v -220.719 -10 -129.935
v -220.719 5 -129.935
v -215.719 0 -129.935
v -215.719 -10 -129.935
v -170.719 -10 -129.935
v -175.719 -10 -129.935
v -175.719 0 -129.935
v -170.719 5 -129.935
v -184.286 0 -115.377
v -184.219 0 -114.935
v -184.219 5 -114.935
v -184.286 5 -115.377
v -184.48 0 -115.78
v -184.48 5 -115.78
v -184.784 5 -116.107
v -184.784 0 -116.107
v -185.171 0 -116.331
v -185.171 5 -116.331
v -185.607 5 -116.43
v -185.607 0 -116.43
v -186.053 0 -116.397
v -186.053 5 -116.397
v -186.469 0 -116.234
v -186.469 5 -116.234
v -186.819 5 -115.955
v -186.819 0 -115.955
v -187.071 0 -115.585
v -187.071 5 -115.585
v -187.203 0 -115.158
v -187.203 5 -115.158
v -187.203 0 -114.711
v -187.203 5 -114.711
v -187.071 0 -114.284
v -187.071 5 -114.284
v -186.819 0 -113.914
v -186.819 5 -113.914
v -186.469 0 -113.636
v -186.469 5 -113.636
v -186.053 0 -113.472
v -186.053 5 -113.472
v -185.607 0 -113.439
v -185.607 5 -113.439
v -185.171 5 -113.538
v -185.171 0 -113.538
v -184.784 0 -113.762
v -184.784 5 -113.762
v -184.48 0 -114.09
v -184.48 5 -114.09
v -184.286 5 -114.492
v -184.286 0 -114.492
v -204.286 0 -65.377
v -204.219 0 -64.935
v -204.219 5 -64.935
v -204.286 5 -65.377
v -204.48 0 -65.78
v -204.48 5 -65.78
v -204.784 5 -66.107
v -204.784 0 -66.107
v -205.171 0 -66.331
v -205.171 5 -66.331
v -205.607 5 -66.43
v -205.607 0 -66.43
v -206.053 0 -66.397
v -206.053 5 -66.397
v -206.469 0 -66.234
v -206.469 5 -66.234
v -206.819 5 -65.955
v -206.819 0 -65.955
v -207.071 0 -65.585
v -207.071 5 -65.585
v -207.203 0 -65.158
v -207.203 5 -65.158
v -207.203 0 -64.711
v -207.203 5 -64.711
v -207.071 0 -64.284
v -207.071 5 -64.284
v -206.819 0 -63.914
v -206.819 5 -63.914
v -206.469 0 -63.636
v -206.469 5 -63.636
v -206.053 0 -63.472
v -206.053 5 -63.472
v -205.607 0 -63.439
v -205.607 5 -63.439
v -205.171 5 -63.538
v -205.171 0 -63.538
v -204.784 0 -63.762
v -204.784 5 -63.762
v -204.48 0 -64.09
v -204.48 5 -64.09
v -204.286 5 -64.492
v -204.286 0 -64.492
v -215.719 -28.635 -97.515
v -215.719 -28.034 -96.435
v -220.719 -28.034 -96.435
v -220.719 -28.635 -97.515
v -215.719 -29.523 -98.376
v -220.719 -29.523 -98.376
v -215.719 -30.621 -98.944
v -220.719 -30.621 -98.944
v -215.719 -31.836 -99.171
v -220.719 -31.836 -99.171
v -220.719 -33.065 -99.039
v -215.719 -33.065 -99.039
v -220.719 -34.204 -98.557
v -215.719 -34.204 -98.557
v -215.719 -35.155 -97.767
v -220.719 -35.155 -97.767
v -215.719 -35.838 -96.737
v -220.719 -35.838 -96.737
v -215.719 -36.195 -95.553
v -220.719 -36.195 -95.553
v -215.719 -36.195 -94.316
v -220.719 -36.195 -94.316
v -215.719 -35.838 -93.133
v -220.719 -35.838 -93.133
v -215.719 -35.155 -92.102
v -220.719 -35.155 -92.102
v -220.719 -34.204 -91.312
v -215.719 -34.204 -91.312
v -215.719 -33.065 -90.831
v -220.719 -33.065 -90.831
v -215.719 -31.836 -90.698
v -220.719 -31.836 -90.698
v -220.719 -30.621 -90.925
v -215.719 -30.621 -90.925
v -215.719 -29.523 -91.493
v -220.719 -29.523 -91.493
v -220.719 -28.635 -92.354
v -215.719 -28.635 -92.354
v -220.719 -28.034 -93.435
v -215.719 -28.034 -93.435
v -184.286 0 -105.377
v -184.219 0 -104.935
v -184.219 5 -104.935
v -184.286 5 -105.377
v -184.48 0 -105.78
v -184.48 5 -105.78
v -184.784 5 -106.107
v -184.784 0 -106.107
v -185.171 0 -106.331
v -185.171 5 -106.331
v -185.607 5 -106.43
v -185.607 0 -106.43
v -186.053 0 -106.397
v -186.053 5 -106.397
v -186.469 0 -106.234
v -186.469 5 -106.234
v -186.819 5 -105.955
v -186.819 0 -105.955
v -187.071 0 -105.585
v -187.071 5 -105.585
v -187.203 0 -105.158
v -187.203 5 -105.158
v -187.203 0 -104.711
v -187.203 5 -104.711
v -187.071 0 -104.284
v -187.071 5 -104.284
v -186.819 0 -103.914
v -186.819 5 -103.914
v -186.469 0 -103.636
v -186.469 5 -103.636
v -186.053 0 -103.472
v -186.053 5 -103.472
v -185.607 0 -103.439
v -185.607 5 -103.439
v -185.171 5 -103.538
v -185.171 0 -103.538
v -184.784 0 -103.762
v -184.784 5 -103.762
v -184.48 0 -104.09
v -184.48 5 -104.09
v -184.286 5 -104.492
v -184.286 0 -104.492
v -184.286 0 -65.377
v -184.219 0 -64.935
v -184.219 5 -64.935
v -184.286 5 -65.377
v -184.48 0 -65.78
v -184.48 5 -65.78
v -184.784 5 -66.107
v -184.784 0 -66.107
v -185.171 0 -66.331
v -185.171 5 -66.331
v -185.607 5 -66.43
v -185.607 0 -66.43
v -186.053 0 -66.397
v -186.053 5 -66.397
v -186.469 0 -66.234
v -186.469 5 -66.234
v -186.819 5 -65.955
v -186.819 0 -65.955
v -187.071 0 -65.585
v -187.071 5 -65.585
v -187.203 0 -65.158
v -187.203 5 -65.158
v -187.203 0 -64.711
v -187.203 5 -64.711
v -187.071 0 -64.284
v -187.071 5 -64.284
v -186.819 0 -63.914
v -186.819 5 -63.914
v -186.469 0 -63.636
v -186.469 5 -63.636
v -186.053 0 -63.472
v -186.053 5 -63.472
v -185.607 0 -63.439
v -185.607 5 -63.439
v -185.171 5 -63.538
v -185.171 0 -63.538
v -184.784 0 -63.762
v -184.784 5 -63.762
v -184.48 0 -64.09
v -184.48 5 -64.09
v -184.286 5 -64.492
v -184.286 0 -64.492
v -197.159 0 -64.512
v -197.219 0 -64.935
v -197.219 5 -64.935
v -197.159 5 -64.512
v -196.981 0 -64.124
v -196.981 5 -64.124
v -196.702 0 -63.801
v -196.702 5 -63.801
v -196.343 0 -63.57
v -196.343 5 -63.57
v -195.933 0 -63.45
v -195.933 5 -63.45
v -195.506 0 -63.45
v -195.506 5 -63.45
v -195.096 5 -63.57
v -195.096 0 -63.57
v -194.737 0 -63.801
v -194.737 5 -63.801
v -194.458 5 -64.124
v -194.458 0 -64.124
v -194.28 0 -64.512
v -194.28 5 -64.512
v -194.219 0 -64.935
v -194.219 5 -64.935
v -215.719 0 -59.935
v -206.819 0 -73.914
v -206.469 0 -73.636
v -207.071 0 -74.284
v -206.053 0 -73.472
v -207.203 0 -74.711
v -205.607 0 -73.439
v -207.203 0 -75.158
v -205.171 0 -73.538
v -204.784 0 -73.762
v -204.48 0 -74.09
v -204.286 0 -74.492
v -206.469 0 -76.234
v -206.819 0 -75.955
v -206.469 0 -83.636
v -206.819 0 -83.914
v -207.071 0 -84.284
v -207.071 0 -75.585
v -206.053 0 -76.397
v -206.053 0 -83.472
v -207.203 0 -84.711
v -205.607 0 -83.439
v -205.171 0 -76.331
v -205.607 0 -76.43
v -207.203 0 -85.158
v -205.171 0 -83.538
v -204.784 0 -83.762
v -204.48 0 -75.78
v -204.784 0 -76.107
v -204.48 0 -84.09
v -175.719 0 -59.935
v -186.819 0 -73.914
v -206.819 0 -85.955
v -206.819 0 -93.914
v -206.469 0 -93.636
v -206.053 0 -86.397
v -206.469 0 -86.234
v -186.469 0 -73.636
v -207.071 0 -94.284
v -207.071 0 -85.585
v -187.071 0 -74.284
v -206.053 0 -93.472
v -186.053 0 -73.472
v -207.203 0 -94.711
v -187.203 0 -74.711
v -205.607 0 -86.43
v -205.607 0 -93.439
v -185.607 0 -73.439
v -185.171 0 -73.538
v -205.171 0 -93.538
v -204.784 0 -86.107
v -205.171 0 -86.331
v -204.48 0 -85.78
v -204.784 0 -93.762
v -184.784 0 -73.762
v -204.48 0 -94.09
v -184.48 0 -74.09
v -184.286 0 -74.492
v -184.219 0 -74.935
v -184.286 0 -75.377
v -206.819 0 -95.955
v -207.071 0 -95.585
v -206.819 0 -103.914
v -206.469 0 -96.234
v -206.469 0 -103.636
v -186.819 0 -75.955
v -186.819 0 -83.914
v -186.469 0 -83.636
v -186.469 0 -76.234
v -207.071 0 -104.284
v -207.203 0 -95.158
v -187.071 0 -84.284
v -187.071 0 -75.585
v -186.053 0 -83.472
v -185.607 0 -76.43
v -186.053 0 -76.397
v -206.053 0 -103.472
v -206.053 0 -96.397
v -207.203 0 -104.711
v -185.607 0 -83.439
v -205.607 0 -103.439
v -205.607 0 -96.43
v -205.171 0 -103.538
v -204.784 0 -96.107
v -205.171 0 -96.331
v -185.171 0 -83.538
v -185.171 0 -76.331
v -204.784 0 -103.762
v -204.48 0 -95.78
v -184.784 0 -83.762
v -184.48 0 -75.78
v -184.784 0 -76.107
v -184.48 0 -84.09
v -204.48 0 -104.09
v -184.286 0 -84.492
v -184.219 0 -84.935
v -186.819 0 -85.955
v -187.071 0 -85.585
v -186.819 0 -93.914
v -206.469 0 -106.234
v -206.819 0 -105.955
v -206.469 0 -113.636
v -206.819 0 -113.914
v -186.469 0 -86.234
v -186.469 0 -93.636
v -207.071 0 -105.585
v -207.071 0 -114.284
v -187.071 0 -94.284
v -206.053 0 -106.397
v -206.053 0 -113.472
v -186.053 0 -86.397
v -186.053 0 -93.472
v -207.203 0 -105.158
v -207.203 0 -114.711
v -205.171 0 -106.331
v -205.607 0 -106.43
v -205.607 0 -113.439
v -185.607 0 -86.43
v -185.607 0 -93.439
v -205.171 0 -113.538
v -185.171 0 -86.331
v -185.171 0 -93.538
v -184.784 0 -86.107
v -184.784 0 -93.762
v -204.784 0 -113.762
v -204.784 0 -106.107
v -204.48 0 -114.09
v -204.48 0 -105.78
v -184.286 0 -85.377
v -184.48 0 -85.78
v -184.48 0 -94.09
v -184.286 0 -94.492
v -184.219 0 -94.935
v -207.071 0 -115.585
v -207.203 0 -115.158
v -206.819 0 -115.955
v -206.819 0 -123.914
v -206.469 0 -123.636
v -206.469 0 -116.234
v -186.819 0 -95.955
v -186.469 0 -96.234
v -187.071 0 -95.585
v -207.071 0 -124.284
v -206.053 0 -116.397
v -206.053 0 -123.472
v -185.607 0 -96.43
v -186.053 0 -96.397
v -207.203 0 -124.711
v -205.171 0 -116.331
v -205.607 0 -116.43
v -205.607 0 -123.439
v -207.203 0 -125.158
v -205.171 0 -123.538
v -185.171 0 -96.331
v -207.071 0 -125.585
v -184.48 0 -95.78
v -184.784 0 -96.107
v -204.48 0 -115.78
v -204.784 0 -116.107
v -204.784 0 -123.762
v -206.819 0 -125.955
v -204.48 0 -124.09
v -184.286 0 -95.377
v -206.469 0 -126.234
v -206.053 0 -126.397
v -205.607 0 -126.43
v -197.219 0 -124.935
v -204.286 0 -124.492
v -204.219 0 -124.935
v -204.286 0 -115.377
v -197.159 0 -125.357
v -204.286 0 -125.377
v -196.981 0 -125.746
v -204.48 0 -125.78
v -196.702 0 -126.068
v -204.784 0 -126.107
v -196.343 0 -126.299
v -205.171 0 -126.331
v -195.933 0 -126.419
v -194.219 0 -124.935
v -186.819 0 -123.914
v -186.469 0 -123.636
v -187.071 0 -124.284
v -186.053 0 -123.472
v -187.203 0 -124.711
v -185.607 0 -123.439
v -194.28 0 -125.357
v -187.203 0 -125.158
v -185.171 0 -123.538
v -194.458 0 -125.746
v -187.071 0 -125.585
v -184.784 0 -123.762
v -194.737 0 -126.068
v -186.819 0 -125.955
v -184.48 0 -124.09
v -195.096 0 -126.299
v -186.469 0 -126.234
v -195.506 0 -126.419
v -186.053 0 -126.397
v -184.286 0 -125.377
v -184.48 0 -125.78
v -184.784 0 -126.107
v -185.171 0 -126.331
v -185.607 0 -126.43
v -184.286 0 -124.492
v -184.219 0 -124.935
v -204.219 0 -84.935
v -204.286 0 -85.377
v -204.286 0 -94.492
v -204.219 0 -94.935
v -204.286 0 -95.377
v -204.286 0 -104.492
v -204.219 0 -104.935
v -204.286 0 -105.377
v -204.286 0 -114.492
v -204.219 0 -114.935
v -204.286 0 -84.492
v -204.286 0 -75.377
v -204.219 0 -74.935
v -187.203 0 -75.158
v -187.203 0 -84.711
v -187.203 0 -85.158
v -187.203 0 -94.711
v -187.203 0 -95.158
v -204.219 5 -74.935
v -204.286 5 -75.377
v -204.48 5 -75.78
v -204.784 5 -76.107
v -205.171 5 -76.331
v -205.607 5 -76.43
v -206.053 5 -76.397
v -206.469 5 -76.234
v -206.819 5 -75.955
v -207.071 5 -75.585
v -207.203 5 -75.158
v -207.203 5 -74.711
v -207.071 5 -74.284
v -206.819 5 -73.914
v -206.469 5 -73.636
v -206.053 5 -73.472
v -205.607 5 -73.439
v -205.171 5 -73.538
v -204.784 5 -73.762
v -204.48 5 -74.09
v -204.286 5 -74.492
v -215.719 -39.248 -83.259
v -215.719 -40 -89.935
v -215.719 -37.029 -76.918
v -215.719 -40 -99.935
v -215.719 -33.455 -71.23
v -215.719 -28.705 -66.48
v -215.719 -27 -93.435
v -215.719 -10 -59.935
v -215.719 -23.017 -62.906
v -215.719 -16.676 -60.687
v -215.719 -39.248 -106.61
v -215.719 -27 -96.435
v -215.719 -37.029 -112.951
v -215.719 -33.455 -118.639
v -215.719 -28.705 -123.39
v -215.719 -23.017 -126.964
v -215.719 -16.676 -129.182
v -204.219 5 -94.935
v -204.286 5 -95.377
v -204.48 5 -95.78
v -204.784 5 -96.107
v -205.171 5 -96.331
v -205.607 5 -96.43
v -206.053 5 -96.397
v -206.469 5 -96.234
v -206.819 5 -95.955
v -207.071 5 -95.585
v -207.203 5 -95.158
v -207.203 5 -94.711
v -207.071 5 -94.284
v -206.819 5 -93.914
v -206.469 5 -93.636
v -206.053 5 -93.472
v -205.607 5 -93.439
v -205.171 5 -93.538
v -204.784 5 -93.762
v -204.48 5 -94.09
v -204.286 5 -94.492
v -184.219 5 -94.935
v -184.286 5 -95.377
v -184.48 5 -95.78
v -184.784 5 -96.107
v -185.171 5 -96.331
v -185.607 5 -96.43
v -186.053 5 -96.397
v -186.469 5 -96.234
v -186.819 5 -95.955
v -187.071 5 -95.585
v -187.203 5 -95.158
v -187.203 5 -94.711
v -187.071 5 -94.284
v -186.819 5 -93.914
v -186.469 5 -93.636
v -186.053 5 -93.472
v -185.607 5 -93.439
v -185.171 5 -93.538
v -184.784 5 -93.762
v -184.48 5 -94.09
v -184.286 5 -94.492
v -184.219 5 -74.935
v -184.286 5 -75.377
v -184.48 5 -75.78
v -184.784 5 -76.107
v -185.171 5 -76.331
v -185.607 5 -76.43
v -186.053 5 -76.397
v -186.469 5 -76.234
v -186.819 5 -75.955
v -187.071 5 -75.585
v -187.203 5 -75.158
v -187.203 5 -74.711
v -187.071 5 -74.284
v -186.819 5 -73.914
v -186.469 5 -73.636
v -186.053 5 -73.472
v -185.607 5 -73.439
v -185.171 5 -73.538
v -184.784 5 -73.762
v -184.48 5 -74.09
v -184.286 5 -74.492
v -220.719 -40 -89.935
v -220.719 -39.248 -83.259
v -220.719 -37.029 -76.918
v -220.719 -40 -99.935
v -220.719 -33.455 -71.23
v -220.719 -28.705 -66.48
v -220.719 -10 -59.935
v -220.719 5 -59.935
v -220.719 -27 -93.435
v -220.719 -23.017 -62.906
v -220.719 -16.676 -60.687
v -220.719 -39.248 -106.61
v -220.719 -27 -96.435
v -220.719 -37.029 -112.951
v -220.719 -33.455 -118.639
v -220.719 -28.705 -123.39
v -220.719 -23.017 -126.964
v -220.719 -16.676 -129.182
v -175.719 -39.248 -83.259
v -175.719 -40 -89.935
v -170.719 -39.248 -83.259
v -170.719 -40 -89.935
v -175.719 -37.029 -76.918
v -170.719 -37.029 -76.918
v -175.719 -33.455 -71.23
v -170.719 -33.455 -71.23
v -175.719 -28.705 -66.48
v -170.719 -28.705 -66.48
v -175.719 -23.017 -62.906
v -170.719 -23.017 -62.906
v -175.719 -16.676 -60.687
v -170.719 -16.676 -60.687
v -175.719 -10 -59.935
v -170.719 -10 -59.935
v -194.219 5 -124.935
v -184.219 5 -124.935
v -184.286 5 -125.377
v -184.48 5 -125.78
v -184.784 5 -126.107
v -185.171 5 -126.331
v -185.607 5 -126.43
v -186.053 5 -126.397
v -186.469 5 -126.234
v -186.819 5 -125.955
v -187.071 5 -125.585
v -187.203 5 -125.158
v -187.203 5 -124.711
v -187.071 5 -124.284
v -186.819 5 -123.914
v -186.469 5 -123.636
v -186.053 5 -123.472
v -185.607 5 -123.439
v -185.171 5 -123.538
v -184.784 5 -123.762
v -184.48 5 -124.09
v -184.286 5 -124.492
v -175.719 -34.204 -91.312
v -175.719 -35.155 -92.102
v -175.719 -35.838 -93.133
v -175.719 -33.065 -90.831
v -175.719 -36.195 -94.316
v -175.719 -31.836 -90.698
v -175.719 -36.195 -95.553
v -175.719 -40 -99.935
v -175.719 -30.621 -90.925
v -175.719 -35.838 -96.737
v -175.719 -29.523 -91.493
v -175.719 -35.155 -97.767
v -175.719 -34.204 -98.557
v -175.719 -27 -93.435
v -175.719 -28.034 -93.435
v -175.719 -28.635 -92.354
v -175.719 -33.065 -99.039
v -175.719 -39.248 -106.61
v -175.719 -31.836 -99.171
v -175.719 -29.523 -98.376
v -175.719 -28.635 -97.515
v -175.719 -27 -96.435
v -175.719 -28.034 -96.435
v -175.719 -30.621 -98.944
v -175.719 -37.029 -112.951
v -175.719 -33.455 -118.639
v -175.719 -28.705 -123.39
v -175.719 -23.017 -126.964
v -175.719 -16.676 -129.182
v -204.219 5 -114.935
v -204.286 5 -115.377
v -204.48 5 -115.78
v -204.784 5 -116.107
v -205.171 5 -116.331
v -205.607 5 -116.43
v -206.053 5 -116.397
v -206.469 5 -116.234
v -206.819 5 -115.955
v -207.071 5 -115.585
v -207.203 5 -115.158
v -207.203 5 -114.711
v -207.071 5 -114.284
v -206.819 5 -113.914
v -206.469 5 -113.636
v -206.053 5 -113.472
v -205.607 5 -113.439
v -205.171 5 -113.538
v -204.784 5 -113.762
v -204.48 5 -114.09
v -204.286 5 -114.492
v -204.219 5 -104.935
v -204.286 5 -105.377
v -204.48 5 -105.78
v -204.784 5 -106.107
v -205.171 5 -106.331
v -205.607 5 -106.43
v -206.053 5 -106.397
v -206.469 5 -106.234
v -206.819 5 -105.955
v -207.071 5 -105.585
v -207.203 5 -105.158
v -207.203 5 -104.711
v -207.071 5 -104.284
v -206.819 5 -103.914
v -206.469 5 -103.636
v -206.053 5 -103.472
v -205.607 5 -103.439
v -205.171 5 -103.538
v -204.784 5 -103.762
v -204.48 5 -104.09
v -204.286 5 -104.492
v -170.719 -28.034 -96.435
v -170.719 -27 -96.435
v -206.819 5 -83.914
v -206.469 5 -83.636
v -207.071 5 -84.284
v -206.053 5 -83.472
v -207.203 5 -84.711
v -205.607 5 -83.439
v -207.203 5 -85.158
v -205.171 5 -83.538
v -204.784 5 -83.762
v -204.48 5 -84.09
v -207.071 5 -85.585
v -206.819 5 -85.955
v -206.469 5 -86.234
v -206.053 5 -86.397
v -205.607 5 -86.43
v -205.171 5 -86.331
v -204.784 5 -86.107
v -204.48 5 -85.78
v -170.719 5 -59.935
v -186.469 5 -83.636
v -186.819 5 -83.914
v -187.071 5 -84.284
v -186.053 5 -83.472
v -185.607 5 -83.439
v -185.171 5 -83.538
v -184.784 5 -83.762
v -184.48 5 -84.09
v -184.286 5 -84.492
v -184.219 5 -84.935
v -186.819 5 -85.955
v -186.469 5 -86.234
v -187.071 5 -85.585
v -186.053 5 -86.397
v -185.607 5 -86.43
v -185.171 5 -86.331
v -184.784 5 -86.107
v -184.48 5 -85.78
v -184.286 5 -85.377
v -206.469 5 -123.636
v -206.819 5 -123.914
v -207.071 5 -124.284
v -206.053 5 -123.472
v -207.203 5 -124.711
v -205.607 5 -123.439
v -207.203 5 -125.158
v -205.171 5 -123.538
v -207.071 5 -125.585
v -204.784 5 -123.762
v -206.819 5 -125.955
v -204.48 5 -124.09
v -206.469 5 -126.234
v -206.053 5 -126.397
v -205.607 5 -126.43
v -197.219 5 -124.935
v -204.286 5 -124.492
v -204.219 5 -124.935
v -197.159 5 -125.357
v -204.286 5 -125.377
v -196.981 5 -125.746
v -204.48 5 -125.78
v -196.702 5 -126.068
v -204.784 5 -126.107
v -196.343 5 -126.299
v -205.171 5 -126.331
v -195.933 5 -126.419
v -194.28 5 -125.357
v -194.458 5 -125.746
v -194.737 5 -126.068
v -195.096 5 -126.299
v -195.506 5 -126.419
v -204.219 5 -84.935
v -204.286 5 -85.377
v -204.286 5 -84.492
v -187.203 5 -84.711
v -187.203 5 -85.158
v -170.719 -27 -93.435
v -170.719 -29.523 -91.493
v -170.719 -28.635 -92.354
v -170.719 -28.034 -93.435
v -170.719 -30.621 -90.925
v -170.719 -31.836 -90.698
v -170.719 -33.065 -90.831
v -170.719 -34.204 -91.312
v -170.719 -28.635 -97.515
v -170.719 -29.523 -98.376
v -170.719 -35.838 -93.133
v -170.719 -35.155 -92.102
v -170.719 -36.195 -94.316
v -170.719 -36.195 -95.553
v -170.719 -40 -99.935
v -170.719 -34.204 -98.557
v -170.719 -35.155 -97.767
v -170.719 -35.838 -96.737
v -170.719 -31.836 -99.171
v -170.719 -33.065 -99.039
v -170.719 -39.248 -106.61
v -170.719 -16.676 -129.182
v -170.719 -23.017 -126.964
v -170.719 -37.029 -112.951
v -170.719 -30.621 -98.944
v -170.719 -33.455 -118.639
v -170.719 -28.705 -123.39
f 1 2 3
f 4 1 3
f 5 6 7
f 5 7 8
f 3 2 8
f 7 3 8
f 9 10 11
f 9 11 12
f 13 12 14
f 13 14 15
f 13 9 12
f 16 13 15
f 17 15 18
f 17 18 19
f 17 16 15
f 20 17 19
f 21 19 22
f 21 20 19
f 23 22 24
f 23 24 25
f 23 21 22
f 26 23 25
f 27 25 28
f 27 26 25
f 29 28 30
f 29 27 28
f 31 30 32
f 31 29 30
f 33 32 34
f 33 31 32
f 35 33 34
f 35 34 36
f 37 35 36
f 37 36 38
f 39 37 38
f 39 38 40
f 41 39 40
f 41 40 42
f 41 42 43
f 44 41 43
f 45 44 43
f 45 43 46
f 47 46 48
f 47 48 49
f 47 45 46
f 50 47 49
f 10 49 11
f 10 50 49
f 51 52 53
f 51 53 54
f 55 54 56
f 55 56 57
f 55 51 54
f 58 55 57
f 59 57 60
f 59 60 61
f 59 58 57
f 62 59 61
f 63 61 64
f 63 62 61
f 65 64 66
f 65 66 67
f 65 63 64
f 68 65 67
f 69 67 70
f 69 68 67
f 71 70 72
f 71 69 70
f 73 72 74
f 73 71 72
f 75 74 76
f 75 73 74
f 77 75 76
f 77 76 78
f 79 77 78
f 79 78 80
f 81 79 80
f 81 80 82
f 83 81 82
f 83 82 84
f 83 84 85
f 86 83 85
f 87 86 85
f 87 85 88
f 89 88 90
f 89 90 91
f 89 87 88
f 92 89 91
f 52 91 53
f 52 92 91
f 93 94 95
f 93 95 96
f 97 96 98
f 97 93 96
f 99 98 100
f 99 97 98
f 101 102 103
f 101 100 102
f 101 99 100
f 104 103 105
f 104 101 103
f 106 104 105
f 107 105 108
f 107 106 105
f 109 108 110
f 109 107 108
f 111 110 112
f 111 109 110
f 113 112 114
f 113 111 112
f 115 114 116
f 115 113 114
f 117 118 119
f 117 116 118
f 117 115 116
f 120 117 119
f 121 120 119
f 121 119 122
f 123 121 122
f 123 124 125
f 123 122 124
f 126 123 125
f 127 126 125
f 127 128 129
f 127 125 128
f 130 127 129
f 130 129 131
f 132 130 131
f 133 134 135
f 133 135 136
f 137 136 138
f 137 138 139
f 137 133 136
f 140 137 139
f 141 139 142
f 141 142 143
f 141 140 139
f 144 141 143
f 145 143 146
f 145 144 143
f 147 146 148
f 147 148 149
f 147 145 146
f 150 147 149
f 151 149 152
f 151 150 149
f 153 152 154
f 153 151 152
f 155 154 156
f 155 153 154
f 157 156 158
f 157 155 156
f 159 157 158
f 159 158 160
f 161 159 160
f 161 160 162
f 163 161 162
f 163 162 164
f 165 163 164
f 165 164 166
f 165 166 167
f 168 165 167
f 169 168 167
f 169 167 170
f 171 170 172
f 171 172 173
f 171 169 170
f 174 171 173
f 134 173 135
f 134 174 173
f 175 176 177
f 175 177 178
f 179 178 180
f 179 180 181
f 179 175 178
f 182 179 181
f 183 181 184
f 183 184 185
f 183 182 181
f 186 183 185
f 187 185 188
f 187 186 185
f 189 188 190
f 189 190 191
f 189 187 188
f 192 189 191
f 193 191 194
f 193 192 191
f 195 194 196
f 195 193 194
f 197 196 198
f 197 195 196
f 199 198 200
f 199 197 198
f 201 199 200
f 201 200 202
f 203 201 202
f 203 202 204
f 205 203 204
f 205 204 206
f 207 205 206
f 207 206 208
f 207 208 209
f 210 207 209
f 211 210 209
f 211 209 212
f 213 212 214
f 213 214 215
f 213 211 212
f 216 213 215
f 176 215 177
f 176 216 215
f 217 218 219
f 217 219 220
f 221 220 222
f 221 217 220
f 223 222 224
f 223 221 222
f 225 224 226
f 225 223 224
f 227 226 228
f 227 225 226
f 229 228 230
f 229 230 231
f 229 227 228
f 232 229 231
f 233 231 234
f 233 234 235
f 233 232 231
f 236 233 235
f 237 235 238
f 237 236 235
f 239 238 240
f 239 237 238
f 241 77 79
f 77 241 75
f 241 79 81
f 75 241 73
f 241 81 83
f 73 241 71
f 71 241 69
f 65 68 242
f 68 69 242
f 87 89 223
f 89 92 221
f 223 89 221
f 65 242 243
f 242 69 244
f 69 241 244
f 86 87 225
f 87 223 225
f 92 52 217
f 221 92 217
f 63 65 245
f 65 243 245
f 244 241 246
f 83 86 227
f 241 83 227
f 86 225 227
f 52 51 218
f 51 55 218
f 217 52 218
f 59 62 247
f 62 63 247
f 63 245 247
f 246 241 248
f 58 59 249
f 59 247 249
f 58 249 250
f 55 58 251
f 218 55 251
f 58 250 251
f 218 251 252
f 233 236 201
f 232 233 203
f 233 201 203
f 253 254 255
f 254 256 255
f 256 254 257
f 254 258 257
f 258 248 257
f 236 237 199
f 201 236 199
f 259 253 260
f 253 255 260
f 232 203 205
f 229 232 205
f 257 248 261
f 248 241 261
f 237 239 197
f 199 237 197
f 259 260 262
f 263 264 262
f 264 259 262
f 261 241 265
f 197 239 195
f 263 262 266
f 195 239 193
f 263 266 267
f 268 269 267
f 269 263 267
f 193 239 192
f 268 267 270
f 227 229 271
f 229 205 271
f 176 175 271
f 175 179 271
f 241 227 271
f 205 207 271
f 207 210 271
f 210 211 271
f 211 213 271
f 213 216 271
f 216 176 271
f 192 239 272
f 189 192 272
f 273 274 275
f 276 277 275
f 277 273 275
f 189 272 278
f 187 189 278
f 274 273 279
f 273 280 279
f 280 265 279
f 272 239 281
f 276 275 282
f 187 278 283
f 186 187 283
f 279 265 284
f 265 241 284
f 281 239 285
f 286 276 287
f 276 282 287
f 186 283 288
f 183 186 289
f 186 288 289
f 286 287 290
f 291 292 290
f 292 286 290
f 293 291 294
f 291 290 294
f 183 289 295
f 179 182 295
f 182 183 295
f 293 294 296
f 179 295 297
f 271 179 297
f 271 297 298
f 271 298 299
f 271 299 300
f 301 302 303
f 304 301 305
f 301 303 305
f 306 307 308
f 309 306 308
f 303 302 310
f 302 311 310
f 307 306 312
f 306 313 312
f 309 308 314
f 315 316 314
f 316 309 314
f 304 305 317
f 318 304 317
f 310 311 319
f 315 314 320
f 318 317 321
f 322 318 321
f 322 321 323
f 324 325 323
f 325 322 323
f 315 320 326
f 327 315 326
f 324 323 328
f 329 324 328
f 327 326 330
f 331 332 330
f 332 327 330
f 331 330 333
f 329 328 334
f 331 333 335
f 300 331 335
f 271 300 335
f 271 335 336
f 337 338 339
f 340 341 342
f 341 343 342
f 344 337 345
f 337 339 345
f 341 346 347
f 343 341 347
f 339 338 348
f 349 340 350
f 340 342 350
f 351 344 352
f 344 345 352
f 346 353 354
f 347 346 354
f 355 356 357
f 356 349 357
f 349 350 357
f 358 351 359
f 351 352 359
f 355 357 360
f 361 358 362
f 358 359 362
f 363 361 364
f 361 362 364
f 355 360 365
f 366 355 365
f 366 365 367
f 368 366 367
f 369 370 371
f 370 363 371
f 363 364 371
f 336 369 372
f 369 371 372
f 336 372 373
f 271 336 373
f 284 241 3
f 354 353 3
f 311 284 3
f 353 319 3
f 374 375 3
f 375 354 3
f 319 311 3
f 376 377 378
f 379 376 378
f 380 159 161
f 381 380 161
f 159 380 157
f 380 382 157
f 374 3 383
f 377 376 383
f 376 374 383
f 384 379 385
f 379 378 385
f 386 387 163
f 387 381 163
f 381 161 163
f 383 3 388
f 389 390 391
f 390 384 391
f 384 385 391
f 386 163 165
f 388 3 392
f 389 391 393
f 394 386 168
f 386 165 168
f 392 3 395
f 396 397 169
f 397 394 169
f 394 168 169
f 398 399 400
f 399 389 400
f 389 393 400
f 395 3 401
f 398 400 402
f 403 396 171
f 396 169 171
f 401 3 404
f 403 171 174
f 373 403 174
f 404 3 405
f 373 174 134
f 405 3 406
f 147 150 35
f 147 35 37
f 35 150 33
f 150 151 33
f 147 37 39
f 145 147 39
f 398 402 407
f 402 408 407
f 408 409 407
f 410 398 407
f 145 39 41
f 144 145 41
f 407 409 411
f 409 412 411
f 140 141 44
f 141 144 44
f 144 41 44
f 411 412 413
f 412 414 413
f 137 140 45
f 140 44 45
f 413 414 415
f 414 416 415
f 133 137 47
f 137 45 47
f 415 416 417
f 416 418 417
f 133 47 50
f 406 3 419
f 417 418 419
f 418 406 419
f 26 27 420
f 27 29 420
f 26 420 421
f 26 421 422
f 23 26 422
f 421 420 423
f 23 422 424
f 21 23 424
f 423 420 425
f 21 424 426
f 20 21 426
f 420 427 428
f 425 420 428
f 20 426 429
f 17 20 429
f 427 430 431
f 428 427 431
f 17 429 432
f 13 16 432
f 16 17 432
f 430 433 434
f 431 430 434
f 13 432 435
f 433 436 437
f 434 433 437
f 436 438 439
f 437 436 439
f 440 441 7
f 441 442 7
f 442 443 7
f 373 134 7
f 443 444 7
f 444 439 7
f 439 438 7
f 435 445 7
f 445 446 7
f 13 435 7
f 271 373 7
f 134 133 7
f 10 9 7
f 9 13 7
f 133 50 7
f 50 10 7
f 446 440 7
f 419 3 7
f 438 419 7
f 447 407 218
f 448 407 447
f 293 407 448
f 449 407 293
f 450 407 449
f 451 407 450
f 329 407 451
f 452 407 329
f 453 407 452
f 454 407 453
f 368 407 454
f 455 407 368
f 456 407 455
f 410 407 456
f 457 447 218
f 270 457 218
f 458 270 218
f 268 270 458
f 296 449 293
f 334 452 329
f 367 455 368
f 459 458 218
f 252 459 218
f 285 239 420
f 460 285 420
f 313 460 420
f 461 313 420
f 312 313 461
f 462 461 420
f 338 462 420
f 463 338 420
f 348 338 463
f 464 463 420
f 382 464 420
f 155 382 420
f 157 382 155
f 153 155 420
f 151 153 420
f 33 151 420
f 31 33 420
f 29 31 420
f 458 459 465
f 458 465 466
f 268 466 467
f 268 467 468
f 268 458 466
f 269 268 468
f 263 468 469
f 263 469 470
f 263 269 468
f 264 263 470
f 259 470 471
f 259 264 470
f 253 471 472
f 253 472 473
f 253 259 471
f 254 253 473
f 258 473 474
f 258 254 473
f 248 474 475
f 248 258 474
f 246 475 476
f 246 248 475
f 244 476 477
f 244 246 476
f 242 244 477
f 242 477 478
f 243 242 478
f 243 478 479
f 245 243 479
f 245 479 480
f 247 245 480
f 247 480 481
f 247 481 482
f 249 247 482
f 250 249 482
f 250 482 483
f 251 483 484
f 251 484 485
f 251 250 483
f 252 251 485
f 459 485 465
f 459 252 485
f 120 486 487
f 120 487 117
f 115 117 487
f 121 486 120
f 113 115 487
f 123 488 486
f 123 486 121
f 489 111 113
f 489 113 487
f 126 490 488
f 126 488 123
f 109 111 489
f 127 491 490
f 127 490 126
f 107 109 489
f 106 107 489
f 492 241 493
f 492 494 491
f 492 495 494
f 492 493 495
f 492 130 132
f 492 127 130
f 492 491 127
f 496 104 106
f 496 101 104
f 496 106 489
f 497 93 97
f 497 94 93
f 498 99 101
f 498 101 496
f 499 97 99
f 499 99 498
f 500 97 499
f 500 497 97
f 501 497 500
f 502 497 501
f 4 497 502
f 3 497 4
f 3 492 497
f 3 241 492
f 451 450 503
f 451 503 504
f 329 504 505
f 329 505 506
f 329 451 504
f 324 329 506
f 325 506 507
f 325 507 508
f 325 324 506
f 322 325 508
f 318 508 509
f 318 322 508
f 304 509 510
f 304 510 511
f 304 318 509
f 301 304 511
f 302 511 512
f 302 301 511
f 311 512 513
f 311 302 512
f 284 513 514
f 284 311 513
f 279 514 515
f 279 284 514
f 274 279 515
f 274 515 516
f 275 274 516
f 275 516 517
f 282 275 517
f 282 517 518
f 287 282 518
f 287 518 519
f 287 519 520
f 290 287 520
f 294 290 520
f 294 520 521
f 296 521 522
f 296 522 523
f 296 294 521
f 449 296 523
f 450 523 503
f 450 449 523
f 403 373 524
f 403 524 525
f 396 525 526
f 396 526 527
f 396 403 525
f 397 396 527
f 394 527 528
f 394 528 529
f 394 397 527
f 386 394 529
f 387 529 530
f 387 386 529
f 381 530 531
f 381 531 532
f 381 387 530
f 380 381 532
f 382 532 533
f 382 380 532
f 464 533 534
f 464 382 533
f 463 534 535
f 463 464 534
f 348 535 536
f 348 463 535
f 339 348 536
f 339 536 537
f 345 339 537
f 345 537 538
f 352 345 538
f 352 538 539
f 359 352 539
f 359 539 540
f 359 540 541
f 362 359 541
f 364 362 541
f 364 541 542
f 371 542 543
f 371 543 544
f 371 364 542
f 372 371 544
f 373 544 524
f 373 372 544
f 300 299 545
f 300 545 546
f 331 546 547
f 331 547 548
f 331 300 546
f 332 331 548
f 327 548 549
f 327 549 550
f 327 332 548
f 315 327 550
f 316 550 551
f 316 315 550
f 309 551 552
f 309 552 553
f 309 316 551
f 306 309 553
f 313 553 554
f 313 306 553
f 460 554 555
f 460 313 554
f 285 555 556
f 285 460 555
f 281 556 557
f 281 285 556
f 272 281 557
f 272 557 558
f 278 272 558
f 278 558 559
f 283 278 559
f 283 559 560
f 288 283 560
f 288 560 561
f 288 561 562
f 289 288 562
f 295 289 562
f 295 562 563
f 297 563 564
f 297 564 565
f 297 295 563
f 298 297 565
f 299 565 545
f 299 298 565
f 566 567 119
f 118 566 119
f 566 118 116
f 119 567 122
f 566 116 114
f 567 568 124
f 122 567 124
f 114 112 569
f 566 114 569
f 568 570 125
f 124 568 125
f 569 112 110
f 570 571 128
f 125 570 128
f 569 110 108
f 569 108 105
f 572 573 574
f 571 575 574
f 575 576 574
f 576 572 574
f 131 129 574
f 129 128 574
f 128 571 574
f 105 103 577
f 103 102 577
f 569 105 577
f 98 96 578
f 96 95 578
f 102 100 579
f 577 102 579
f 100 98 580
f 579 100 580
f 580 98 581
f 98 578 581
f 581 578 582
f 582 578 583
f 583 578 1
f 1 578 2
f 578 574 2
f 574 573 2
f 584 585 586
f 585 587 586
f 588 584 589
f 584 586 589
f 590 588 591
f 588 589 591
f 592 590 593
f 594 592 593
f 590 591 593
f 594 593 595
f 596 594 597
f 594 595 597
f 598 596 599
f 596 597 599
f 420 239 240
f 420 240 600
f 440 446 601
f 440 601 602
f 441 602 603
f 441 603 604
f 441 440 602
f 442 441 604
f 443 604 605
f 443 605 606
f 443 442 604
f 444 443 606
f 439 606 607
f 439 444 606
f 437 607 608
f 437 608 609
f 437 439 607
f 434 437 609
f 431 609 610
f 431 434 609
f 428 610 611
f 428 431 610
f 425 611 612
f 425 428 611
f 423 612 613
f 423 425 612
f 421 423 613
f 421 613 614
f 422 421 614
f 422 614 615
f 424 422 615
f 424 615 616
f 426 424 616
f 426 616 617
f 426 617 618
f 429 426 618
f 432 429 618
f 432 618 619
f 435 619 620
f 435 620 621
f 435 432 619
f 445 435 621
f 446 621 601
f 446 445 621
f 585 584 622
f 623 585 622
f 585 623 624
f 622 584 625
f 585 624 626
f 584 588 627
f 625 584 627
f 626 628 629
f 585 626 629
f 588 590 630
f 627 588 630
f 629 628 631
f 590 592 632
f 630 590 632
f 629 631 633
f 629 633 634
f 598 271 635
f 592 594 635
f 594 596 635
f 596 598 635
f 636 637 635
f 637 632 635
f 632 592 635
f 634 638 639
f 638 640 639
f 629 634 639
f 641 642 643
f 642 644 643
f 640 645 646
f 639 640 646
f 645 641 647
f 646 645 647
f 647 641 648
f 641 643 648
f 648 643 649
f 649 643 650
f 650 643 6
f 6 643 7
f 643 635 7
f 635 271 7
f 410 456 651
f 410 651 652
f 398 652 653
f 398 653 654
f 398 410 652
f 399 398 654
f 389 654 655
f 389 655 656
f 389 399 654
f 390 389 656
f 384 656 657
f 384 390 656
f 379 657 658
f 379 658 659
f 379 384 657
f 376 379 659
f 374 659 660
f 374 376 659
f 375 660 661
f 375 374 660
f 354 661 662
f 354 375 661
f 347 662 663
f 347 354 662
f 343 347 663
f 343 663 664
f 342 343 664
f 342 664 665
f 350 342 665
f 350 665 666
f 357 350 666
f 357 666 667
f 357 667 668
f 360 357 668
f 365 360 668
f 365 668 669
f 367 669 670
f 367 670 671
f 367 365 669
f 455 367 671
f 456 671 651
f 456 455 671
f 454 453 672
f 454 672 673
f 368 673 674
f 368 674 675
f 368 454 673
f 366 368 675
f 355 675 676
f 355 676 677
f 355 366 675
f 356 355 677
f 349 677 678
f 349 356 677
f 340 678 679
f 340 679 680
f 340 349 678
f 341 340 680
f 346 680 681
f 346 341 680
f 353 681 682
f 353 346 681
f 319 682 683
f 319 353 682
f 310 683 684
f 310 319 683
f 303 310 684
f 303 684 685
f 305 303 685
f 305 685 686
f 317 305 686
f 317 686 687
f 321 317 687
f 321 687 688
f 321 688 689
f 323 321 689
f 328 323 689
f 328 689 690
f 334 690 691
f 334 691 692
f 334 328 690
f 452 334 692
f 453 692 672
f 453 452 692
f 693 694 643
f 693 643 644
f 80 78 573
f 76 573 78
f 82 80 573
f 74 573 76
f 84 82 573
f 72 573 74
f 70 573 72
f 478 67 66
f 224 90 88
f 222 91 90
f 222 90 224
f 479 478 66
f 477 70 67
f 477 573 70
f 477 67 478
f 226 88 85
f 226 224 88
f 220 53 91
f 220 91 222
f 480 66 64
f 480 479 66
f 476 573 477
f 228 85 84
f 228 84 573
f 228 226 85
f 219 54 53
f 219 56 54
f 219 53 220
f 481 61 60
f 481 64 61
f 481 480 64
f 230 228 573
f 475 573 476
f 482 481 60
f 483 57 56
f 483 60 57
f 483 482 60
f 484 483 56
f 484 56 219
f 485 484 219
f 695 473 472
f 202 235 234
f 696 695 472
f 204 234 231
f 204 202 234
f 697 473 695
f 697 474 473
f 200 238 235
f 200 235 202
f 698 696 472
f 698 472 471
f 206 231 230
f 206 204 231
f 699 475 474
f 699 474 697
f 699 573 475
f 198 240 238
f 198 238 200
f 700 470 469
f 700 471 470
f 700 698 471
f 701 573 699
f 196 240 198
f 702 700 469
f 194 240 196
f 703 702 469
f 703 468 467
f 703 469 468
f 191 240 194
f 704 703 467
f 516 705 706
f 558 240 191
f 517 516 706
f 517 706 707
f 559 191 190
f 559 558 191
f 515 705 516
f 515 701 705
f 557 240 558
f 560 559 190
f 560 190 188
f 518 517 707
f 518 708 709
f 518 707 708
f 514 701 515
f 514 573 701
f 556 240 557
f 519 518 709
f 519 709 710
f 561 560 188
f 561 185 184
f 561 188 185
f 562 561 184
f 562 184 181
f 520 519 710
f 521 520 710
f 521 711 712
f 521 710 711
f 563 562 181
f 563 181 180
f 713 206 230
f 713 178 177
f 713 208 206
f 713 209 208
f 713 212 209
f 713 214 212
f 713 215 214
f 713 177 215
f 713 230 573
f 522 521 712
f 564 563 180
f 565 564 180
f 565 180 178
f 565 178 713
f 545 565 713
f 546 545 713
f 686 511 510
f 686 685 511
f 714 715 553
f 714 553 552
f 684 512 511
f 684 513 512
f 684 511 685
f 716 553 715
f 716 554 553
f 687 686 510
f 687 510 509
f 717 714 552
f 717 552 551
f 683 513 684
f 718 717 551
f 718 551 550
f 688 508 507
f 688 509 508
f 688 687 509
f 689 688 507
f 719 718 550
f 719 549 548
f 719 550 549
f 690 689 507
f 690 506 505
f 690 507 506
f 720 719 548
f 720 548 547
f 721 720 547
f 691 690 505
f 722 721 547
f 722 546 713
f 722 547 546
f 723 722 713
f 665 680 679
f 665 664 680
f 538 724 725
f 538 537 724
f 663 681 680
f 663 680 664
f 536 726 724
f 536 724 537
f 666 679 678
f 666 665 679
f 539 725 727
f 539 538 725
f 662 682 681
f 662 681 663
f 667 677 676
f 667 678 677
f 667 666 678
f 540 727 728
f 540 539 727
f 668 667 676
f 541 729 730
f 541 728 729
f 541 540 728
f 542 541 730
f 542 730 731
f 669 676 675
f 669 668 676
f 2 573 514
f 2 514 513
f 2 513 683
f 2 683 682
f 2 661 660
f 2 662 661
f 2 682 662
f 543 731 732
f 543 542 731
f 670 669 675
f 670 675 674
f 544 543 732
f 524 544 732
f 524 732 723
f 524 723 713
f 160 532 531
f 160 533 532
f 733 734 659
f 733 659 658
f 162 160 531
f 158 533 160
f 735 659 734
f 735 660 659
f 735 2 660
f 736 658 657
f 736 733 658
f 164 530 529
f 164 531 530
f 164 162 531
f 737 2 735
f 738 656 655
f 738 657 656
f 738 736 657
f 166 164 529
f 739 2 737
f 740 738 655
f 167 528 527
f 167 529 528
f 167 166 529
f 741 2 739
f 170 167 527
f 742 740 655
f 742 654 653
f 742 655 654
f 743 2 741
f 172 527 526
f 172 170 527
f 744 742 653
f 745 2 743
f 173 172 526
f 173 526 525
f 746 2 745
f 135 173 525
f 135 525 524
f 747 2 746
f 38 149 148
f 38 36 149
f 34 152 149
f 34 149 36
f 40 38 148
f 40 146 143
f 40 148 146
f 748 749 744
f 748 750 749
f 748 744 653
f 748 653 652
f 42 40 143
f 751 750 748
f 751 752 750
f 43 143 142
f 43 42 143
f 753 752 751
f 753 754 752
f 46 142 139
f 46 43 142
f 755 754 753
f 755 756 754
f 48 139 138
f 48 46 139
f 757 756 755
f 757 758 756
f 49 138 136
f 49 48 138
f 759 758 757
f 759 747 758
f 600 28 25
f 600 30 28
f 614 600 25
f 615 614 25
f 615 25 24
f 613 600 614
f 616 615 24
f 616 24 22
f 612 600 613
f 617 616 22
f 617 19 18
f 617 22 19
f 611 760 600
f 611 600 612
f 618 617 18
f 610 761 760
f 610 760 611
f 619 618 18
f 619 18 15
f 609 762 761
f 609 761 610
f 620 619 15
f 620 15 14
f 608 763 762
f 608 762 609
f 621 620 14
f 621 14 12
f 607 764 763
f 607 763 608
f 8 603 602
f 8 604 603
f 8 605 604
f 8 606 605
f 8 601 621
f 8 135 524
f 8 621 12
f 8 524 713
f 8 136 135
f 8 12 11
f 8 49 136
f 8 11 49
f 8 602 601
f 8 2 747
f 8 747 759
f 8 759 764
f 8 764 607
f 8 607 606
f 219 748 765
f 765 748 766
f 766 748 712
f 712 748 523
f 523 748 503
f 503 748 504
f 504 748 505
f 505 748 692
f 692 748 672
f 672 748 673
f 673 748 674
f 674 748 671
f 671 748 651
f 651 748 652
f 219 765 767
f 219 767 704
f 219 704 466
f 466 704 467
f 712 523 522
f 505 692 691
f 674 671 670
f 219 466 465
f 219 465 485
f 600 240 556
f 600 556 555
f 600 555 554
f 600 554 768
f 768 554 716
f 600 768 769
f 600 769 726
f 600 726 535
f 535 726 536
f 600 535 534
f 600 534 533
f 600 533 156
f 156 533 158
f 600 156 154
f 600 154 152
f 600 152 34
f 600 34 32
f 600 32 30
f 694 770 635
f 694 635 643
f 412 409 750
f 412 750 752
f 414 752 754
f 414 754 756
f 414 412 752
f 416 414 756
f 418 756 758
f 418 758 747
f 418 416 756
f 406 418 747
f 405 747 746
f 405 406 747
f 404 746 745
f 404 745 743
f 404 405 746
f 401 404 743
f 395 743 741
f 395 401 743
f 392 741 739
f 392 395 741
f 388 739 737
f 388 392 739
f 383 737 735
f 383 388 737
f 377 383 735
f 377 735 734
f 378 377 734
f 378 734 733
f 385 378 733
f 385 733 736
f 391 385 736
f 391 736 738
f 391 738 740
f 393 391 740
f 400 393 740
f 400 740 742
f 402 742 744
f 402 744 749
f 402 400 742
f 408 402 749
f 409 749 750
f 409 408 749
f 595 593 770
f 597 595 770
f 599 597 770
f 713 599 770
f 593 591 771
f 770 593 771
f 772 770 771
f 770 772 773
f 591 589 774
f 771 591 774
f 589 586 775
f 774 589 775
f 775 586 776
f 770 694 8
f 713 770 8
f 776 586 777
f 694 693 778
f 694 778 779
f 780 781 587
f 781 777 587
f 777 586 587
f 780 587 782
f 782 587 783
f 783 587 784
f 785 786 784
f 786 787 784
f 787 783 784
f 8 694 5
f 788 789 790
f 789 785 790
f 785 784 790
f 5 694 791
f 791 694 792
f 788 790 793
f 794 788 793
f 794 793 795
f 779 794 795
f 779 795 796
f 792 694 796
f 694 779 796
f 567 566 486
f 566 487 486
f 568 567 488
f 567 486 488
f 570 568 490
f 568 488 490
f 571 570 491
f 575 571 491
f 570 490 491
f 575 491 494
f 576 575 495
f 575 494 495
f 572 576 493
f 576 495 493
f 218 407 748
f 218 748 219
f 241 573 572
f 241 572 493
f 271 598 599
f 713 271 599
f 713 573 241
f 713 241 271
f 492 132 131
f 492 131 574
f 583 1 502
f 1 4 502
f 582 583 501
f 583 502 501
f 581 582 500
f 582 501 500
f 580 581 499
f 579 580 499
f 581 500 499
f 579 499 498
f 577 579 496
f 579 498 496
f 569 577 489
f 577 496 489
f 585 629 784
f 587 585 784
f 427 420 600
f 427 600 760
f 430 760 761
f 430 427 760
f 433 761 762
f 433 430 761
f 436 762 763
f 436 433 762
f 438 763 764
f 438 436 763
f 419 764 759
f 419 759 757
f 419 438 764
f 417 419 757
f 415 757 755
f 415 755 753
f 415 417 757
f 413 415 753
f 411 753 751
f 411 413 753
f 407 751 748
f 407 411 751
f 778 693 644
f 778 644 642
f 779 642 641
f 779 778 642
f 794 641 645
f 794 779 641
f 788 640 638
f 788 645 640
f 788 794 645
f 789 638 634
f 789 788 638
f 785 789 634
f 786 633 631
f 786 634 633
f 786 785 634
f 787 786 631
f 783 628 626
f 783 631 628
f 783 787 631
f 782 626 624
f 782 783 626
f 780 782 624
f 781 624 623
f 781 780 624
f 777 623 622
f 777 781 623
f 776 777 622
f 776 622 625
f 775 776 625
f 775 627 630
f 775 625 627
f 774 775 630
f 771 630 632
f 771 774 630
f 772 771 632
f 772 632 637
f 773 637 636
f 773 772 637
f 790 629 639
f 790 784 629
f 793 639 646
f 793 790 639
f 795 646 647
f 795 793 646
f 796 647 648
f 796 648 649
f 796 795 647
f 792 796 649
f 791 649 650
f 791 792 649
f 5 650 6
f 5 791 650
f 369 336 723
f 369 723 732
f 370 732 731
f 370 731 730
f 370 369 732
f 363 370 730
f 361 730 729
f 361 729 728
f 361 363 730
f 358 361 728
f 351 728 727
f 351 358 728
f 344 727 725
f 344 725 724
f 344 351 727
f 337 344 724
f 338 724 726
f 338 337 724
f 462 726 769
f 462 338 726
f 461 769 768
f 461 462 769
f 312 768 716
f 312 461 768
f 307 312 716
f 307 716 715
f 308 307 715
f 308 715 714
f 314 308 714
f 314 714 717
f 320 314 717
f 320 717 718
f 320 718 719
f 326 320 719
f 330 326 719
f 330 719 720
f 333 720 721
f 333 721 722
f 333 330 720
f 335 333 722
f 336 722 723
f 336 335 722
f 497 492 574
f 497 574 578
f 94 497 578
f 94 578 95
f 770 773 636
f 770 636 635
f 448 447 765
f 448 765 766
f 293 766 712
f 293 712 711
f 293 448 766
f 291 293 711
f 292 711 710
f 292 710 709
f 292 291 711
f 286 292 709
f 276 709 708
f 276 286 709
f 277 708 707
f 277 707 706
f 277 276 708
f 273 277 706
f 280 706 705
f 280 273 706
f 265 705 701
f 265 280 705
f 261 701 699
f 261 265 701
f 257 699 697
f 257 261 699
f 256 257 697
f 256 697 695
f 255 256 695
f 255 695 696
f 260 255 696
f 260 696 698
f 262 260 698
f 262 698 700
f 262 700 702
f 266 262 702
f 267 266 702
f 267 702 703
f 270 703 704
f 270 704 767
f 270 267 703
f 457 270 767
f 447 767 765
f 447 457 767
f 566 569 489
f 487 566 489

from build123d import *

# Parameters (mm, degrees)
SKETCH1_W           = 50
SKETCH1_H           = 70
SKETCH1_R           = 1.5
BOSS_EXTRUDE1_DEPTH = 5
SKETCH2_W           = 5
SKETCH2_H           = 70
BOSS_EXTRUDE2_DEPTH = 40
FILLET1_R           = 30
CUT_EXTRUDE1_DEPTH  = 51


with BuildPart() as part:
    # Sketch1 → Boss-Extrude1 (new body)
    with BuildSketch(Plane(origin=(0, 0, 0), x_dir=(1, 0, 0), z_dir=(0, 1, 0))):
        with Locations((-195.719432441, 94.934599156)):
            Rectangle(SKETCH1_W, SKETCH1_H)
        with Locations((-185.719432441, 94.934599156)):
            Circle(SKETCH1_R, mode=Mode.SUBTRACT)
        with Locations((-205.719432441, 94.934599156)):
            Circle(SKETCH1_R, mode=Mode.SUBTRACT)
        with Locations((-205.719432441, 104.934599156)):
            Circle(SKETCH1_R, mode=Mode.SUBTRACT)
        with Locations((-185.719432441, 104.934599156)):
            Circle(SKETCH1_R, mode=Mode.SUBTRACT)
        with Locations((-205.719432441, 114.934599156)):
            Circle(SKETCH1_R, mode=Mode.SUBTRACT)
        with Locations((-185.719432441, 114.934599156)):
            Circle(SKETCH1_R, mode=Mode.SUBTRACT)
        with Locations((-205.719432441, 124.934599156)):
            Circle(SKETCH1_R, mode=Mode.SUBTRACT)
        with Locations((-185.719432441, 124.934599156)):
            Circle(SKETCH1_R, mode=Mode.SUBTRACT)
        with Locations((-205.719432441, 84.934599156)):
            Circle(SKETCH1_R, mode=Mode.SUBTRACT)
        with Locations((-185.719432441, 84.934599156)):
            Circle(SKETCH1_R, mode=Mode.SUBTRACT)
        with Locations((-205.719432441, 74.934599156)):
            Circle(SKETCH1_R, mode=Mode.SUBTRACT)
        with Locations((-185.719432441, 74.934599156)):
            Circle(SKETCH1_R, mode=Mode.SUBTRACT)
        with Locations((-205.719432441, 64.934599156)):
            Circle(SKETCH1_R, mode=Mode.SUBTRACT)
        with Locations((-185.719432441, 64.934599156)):
            Circle(SKETCH1_R, mode=Mode.SUBTRACT)
        with BuildLine():
            Line((-197.219432441, 124.934599156), (-197.219432441, 64.934599156))
            ThreePointArc((-197.219432441, 64.934599156), (-195.719432441, 63.434599156), (-194.219432441, 64.934599156))
            Line((-194.219432441, 64.934599156), (-194.219432441, 124.934599156))
            ThreePointArc((-194.219432441, 124.934599156), (-195.719432441, 126.434599156), (-197.219432441, 124.934599156))
        make_face(mode=Mode.SUBTRACT)
    extrude(amount=BOSS_EXTRUDE1_DEPTH)

    # Sketch2 → Boss-Extrude2 (add)
    with BuildSketch(Plane(origin=(0, 0, 0), x_dir=(1, 0, 0), z_dir=(0, 1, 0))):
        with Locations((-218.219432441, 94.934599156)):
            Rectangle(SKETCH2_W, SKETCH2_H)
        with Locations((-173.219432441, 94.934599156)):
            Rectangle(SKETCH2_W, SKETCH2_H)
    extrude(amount=-BOSS_EXTRUDE2_DEPTH)

    # Fillet1
    fillet1_edges = [part.edges().sort_by_distance(p)[0] for p in [
        (-218.219432441, -40, -129.934599156),
        (-218.219432441, -40, -59.934599156),
        (-173.219432441, -40, -59.934599156),
        (-173.219432441, -40, -129.934599156),
    ]]
    fillet(fillet1_edges, radius=FILLET1_R)

    # Sketch3 → Cut-Extrude1 (cut, through all)
    with BuildSketch(Plane(origin=(-170.719432441, 0, 0), x_dir=(0, 0, -1), z_dir=(1, 0, 0))):
        with BuildLine():
            Line((94.934599156, -27), (96.434599156, -27))
            Line((96.434599156, -27), (96.434599156, -28.034196172))
            ThreePointArc((96.434599156, -28.034196172), (94.934599156, -36.24), (93.434599156, -28.034196172))
            Line((93.434599156, -28.034196172), (93.434599156, -27))
            Line((93.434599156, -27), (94.934599156, -27))
        make_face()
    extrude(amount=-CUT_EXTRUDE1_DEPTH, mode=Mode.SUBTRACT)


solid = part.part
